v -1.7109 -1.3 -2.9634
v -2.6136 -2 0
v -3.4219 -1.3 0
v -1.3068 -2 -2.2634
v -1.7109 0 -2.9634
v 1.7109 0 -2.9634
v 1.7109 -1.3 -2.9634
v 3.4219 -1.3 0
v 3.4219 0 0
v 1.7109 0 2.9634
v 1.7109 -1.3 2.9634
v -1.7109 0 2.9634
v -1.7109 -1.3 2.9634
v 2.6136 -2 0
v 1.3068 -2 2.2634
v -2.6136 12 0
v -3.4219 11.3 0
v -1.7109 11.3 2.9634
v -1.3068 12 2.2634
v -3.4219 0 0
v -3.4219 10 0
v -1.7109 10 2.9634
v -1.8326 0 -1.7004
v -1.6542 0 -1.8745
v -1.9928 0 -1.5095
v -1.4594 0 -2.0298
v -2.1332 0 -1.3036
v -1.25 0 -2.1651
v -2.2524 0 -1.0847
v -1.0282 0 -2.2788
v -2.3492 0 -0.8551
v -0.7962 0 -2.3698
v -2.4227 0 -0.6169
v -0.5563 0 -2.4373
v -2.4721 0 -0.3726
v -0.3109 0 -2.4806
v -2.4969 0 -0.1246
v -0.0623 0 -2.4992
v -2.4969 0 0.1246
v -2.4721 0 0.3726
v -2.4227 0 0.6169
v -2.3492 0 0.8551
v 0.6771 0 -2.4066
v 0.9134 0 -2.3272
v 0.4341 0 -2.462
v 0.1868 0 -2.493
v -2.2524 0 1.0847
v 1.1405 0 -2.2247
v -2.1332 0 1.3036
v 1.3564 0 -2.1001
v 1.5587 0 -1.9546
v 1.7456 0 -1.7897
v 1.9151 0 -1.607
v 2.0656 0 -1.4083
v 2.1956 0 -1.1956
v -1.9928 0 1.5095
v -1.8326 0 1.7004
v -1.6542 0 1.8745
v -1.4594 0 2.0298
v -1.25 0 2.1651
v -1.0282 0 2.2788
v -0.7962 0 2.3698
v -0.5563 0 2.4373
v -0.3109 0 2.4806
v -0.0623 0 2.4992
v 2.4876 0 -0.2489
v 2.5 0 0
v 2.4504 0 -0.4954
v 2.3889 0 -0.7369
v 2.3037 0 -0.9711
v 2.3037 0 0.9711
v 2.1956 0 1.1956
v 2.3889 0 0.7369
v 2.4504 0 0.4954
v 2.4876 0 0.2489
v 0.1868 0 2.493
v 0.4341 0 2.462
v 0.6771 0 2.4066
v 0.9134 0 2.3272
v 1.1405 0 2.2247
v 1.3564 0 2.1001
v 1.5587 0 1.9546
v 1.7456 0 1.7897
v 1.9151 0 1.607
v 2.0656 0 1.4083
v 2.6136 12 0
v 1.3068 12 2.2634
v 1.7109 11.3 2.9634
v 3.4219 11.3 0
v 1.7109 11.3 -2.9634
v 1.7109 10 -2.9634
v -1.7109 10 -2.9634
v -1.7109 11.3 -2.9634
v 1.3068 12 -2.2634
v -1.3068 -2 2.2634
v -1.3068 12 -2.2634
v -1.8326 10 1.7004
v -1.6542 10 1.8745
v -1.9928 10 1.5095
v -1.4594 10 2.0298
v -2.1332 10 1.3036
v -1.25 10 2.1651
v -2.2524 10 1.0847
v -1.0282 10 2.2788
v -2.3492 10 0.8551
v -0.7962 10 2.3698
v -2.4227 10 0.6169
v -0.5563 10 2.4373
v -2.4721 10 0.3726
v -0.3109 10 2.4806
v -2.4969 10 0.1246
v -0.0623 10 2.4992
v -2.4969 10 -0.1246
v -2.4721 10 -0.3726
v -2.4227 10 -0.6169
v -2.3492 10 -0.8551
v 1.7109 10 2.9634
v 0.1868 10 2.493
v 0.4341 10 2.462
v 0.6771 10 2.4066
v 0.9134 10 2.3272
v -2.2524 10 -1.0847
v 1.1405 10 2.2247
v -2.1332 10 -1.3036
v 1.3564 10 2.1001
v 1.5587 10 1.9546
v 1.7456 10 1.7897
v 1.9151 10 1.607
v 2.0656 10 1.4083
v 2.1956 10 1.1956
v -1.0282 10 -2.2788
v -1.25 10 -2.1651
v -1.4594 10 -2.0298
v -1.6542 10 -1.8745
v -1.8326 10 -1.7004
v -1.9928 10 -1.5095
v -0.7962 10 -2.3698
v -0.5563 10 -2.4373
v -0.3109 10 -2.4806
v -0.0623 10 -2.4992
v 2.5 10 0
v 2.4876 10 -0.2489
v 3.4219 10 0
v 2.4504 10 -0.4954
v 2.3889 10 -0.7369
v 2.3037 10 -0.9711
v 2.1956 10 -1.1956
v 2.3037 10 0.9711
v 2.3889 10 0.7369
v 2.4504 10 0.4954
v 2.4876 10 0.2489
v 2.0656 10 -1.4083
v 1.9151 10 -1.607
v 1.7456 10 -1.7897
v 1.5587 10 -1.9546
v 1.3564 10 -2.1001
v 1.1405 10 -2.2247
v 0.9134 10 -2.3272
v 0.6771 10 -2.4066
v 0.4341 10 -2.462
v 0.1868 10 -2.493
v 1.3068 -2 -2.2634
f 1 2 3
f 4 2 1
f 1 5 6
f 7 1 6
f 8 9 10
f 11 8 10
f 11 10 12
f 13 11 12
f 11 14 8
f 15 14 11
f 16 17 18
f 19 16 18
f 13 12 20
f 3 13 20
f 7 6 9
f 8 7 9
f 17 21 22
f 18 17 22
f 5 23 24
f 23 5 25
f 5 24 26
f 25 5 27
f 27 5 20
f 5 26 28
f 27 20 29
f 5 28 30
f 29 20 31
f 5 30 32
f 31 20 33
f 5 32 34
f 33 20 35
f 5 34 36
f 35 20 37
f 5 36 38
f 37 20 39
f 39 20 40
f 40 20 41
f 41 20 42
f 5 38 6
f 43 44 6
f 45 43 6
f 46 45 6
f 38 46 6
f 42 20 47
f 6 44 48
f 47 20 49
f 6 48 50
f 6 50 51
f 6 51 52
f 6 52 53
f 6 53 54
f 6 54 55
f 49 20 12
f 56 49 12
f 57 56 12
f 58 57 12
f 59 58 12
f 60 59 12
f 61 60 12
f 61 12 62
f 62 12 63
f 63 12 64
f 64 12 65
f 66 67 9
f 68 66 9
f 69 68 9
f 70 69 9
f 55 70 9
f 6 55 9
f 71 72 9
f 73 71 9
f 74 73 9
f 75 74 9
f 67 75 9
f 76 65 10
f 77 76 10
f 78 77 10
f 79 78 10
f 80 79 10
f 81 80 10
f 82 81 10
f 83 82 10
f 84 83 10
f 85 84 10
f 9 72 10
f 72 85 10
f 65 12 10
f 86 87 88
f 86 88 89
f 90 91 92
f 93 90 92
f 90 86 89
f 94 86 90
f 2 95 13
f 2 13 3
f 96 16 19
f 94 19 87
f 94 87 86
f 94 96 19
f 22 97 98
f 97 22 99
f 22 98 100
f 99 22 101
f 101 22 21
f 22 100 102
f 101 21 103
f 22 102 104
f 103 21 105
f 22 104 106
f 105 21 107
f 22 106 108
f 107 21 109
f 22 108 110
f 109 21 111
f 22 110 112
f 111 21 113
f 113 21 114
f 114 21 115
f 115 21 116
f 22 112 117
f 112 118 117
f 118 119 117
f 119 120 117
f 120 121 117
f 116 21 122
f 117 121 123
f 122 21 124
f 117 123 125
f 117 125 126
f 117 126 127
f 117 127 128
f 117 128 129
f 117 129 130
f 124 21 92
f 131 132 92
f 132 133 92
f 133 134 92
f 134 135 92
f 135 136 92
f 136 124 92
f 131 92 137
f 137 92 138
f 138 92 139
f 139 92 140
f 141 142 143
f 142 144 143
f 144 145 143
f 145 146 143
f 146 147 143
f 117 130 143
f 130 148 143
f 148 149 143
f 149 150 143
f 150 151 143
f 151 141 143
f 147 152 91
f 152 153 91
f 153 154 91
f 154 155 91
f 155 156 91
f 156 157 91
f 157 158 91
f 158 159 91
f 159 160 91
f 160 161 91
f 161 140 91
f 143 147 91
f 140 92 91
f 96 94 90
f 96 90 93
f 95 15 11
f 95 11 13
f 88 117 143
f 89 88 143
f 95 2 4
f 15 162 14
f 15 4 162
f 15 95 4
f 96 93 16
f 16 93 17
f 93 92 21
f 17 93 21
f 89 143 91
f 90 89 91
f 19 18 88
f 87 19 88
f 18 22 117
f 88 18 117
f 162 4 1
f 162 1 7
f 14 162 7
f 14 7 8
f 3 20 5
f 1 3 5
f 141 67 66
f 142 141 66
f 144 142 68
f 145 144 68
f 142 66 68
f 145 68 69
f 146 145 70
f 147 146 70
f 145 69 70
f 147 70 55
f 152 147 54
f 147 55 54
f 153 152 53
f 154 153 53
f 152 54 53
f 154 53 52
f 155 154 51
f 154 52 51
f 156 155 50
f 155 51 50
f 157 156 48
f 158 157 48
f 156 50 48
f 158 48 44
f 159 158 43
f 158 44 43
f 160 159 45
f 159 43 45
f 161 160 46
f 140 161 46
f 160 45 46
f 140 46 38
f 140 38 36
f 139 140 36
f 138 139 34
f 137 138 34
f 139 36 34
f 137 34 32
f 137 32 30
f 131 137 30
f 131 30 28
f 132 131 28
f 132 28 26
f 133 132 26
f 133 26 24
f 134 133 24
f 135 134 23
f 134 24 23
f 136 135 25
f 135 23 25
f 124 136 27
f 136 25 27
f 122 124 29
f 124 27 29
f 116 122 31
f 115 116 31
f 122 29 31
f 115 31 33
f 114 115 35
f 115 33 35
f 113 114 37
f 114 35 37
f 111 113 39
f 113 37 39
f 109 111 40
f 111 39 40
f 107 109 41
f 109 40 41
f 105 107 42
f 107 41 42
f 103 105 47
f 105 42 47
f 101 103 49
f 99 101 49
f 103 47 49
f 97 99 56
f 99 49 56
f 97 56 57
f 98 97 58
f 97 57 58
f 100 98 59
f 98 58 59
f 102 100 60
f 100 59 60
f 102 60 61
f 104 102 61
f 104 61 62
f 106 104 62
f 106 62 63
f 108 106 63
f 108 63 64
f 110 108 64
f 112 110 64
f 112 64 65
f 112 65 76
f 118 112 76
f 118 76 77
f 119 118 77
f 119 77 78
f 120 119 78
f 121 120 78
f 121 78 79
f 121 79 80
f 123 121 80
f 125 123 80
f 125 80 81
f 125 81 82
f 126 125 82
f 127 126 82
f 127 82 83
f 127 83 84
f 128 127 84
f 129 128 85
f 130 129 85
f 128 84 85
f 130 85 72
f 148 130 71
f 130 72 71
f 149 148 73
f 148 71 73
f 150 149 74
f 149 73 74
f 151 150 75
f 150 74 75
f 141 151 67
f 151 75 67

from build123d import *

# Parameters (mm, degrees)
SKETCH1_R           = 2.5
BOSS_EXTRUDE1_DEPTH = 10
BOSS_EXTRUDE2_DEPTH = 2
BOSS_EXTRUDE3_DEPTH = 2
CHAMFER1_SIZE       = 0.7


with BuildPart() as part:
    # Sketch1 → Boss-Extrude1 (new body)
    with BuildSketch(Plane(origin=(0, 0, 0), x_dir=(1, 0, 0), z_dir=(0, 1, 0))):
        Circle(SKETCH1_R)
    extrude(amount=BOSS_EXTRUDE1_DEPTH)

    # Sketch3 → Boss-Extrude2 (add)
    with BuildSketch(Plane.XZ):
        Polygon((3.421887709, 0), (1.710943854, 2.963441685), (-1.710943854, 2.963441685), (-3.421887709, 0), (-1.710943854, -2.963441685), (1.710943854, -2.963441685), align=None)
    extrude(amount=BOSS_EXTRUDE2_DEPTH)

    # Sketch2 → Boss-Extrude3 (add)
    with BuildSketch(Plane(origin=(0, 10, 0), x_dir=(1, 0, 0), z_dir=(0, 1, 0))):
        Polygon((3.421887709, 0), (1.710943854, 2.963441685), (-1.710943854, 2.963441685), (-3.421887709, 0), (-1.710943854, -2.963441685), (1.710943854, -2.963441685), align=None)
    extrude(amount=BOSS_EXTRUDE3_DEPTH)

    # Chamfer1
    chamfer1_edges = [part.edges().sort_by_distance(p)[0] for p in [
        (0, 12, -2.963441685),
        (-2.566415782, 12, -1.481720842),
        (-2.566415782, 12, 1.481720842),
        (0, 12, 2.963441685),
        (2.566415782, 12, 1.481720842),
        (2.566415782, 12, -1.481720842),
        (2.566415782, -2, -1.481720842),
        (2.566415782, -2, 1.481720842),
        (0, -2, 2.963441685),
        (-2.566415782, -2, 1.481720842),
        (-2.566415782, -2, -1.481720842),
        (0, -2, -2.963441685),
    ]]
    chamfer(chamfer1_edges, length=CHAMFER1_SIZE)


solid = part.part
